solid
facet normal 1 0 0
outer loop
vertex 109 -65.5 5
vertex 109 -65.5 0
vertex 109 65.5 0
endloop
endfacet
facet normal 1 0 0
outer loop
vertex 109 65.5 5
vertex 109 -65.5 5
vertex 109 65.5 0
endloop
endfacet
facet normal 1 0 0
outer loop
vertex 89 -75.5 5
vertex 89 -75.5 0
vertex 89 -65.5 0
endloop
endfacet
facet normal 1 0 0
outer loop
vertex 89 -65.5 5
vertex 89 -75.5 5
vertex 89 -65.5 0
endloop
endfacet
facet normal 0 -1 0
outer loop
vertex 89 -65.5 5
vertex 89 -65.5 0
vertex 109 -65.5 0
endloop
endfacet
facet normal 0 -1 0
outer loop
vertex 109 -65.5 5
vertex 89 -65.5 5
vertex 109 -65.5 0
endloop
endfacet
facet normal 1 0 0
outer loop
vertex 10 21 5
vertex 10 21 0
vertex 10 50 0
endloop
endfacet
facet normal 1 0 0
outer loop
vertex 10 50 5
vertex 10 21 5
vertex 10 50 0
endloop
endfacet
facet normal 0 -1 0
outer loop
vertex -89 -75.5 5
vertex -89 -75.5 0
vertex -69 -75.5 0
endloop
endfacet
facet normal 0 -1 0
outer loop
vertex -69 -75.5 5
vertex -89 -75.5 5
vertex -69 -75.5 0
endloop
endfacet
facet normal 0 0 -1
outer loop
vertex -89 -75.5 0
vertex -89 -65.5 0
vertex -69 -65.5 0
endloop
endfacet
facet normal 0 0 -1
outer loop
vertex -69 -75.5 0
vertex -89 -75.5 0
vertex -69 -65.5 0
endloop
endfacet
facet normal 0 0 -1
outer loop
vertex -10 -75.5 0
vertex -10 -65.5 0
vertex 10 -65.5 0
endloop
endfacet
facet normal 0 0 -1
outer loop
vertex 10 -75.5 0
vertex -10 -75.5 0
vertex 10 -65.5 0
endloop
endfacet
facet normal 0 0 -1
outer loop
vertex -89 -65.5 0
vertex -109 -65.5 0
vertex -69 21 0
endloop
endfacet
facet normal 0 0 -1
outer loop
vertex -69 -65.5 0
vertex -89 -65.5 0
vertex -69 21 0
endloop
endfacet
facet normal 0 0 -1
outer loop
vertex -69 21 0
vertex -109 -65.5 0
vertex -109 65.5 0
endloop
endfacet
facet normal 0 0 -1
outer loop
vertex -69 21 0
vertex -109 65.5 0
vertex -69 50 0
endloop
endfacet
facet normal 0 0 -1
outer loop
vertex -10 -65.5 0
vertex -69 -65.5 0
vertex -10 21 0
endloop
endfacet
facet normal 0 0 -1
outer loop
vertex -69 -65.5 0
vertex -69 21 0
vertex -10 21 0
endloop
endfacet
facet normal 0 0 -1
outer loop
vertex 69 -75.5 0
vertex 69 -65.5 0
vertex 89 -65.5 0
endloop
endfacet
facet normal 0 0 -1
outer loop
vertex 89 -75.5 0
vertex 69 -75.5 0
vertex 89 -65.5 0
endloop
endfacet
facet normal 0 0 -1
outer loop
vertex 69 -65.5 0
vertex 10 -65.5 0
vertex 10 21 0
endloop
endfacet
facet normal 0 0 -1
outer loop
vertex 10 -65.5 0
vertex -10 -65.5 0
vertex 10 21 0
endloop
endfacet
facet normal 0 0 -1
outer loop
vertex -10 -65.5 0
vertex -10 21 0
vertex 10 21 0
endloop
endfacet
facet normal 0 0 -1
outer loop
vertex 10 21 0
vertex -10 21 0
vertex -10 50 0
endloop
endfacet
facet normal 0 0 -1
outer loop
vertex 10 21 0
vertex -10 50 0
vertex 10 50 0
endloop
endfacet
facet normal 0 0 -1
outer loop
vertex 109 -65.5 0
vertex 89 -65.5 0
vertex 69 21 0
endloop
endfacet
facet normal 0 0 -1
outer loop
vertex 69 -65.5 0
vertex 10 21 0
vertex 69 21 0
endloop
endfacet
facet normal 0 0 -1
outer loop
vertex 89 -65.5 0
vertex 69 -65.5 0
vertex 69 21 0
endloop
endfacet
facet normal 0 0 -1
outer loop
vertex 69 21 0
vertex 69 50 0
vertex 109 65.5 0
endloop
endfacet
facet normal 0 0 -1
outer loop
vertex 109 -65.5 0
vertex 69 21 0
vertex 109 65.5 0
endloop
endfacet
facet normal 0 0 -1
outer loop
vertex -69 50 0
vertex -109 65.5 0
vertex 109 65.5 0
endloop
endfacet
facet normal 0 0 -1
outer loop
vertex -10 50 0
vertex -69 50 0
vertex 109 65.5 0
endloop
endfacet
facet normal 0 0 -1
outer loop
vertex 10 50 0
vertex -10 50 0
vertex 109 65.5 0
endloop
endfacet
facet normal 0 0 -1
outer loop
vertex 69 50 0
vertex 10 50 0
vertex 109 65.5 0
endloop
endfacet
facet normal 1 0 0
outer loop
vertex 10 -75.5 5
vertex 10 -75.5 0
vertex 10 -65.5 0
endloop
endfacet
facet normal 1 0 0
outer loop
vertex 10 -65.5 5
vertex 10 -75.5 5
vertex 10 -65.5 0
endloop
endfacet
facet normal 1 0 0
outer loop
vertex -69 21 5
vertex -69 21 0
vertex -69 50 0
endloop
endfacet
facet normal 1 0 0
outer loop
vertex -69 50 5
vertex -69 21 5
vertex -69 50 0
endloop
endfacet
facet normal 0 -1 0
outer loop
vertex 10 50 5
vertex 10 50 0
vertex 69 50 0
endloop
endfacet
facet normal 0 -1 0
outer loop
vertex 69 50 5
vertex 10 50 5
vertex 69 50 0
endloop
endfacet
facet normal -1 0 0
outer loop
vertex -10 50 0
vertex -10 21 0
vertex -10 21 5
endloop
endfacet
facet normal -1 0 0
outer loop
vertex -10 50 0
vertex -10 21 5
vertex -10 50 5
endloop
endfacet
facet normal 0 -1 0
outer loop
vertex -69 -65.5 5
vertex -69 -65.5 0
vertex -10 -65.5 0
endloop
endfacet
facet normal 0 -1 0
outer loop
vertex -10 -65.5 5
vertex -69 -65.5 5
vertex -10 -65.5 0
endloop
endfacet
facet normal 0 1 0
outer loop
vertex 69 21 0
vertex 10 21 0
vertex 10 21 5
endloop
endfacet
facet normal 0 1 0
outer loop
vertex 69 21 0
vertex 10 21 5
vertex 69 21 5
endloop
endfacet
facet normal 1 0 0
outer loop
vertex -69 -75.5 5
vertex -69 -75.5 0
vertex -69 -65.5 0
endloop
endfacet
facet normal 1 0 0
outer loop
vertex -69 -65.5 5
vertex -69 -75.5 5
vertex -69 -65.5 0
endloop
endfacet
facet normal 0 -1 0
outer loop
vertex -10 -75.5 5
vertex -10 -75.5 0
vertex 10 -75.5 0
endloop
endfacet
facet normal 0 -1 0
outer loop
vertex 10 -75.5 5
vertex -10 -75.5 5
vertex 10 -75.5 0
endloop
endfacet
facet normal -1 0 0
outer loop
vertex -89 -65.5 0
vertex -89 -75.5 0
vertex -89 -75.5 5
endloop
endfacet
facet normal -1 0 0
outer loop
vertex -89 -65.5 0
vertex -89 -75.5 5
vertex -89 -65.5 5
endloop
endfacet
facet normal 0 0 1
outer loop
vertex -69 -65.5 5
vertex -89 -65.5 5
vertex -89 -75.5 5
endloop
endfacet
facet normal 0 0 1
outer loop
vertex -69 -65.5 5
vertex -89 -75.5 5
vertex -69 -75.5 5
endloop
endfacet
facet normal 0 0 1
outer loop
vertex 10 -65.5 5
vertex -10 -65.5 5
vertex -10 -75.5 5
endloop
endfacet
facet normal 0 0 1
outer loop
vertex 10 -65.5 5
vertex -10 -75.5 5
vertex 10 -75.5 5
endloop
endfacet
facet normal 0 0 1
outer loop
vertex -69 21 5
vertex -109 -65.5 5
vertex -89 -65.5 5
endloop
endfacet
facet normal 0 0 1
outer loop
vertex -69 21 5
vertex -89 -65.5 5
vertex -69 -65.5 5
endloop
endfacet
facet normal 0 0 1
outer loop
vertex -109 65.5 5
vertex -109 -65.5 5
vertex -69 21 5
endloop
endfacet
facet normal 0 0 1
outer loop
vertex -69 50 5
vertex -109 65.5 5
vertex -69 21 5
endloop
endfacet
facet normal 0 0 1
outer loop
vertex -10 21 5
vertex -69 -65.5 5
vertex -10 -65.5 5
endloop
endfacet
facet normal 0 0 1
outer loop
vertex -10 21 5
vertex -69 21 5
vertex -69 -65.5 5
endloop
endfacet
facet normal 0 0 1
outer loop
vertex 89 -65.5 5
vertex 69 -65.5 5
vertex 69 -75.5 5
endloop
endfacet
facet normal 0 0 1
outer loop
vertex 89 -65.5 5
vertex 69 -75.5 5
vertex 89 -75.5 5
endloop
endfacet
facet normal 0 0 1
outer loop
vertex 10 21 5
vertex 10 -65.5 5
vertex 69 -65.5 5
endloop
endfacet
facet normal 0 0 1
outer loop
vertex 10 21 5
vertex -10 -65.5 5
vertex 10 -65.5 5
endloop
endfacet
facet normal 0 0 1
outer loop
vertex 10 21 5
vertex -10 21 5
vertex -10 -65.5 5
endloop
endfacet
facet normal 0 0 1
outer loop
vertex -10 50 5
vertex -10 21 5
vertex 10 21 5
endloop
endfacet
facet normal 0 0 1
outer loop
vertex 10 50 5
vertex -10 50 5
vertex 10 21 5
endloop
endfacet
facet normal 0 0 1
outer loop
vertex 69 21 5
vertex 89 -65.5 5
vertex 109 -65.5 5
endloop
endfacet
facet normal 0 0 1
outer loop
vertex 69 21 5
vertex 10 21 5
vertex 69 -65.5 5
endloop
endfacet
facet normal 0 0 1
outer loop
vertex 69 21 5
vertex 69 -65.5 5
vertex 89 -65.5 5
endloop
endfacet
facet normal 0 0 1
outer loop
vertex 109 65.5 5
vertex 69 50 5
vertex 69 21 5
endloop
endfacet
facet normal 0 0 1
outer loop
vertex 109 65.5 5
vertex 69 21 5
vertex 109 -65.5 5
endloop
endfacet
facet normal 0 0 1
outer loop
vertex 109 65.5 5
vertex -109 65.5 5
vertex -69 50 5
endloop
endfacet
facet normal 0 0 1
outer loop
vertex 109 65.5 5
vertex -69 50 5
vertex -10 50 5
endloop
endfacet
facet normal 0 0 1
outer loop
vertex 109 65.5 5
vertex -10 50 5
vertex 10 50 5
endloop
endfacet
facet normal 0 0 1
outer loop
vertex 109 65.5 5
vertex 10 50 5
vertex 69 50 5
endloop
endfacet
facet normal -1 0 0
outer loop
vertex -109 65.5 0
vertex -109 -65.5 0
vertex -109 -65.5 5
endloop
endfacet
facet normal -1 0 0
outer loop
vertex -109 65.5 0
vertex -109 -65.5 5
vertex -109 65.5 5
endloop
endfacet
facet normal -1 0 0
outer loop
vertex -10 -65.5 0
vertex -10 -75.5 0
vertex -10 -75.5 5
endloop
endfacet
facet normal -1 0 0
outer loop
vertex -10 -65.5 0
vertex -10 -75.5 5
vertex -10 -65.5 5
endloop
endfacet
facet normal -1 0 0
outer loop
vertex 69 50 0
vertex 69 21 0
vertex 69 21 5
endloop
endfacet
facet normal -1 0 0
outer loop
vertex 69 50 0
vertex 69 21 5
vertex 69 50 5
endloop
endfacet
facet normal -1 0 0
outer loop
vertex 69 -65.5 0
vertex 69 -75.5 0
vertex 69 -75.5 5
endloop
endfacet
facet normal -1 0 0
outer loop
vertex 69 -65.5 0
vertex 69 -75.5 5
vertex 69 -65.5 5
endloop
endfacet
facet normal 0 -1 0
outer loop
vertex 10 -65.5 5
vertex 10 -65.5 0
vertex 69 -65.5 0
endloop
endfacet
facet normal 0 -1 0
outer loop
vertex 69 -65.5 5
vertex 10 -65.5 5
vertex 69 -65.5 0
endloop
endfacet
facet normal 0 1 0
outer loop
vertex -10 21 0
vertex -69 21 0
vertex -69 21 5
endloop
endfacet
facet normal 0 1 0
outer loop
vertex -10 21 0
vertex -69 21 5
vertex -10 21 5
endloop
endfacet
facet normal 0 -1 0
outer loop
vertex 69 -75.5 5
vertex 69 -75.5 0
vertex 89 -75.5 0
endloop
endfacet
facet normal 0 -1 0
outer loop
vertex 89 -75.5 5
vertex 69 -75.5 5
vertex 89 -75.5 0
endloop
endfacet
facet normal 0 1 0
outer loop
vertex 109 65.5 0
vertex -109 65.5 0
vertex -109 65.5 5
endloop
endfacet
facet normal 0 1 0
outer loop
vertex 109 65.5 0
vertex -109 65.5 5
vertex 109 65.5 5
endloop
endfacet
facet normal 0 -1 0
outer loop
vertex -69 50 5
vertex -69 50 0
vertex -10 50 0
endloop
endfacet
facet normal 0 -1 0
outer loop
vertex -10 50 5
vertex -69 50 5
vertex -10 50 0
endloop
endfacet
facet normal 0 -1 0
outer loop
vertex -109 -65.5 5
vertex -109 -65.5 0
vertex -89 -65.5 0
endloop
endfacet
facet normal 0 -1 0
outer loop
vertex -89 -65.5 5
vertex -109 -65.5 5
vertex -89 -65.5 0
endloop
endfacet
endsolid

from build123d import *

# Parameters (mm, degrees)
SKETCH1_W           = 218
SKETCH1_H           = 131
SKETCH1_W_2         = 59
SKETCH1_H_2         = 29
SKETCH1_W_3         = 20
SKETCH1_H_3         = 10
BOSS_EXTRUDE1_DEPTH = 5


with BuildPart() as part:
    # Sketch1 → Boss-Extrude1 (new body)
    with BuildSketch(Plane.XY):
        Rectangle(SKETCH1_W, SKETCH1_H)
        with Locations((39.5, 35.5)):
            Rectangle(SKETCH1_W_2, SKETCH1_H_2, mode=Mode.SUBTRACT)
        with Locations((-39.5, 35.5)):
            Rectangle(SKETCH1_W_2, SKETCH1_H_2, mode=Mode.SUBTRACT)
        with Locations((-79, -70.5)):
            Rectangle(SKETCH1_W_3, SKETCH1_H_3)
        with Locations((0, -70.5)):
            Rectangle(SKETCH1_W_3, SKETCH1_H_3)
        with Locations((79, -70.5)):
            Rectangle(SKETCH1_W_3, SKETCH1_H_3)
    extrude(amount=BOSS_EXTRUDE1_DEPTH)


solid = part.part
